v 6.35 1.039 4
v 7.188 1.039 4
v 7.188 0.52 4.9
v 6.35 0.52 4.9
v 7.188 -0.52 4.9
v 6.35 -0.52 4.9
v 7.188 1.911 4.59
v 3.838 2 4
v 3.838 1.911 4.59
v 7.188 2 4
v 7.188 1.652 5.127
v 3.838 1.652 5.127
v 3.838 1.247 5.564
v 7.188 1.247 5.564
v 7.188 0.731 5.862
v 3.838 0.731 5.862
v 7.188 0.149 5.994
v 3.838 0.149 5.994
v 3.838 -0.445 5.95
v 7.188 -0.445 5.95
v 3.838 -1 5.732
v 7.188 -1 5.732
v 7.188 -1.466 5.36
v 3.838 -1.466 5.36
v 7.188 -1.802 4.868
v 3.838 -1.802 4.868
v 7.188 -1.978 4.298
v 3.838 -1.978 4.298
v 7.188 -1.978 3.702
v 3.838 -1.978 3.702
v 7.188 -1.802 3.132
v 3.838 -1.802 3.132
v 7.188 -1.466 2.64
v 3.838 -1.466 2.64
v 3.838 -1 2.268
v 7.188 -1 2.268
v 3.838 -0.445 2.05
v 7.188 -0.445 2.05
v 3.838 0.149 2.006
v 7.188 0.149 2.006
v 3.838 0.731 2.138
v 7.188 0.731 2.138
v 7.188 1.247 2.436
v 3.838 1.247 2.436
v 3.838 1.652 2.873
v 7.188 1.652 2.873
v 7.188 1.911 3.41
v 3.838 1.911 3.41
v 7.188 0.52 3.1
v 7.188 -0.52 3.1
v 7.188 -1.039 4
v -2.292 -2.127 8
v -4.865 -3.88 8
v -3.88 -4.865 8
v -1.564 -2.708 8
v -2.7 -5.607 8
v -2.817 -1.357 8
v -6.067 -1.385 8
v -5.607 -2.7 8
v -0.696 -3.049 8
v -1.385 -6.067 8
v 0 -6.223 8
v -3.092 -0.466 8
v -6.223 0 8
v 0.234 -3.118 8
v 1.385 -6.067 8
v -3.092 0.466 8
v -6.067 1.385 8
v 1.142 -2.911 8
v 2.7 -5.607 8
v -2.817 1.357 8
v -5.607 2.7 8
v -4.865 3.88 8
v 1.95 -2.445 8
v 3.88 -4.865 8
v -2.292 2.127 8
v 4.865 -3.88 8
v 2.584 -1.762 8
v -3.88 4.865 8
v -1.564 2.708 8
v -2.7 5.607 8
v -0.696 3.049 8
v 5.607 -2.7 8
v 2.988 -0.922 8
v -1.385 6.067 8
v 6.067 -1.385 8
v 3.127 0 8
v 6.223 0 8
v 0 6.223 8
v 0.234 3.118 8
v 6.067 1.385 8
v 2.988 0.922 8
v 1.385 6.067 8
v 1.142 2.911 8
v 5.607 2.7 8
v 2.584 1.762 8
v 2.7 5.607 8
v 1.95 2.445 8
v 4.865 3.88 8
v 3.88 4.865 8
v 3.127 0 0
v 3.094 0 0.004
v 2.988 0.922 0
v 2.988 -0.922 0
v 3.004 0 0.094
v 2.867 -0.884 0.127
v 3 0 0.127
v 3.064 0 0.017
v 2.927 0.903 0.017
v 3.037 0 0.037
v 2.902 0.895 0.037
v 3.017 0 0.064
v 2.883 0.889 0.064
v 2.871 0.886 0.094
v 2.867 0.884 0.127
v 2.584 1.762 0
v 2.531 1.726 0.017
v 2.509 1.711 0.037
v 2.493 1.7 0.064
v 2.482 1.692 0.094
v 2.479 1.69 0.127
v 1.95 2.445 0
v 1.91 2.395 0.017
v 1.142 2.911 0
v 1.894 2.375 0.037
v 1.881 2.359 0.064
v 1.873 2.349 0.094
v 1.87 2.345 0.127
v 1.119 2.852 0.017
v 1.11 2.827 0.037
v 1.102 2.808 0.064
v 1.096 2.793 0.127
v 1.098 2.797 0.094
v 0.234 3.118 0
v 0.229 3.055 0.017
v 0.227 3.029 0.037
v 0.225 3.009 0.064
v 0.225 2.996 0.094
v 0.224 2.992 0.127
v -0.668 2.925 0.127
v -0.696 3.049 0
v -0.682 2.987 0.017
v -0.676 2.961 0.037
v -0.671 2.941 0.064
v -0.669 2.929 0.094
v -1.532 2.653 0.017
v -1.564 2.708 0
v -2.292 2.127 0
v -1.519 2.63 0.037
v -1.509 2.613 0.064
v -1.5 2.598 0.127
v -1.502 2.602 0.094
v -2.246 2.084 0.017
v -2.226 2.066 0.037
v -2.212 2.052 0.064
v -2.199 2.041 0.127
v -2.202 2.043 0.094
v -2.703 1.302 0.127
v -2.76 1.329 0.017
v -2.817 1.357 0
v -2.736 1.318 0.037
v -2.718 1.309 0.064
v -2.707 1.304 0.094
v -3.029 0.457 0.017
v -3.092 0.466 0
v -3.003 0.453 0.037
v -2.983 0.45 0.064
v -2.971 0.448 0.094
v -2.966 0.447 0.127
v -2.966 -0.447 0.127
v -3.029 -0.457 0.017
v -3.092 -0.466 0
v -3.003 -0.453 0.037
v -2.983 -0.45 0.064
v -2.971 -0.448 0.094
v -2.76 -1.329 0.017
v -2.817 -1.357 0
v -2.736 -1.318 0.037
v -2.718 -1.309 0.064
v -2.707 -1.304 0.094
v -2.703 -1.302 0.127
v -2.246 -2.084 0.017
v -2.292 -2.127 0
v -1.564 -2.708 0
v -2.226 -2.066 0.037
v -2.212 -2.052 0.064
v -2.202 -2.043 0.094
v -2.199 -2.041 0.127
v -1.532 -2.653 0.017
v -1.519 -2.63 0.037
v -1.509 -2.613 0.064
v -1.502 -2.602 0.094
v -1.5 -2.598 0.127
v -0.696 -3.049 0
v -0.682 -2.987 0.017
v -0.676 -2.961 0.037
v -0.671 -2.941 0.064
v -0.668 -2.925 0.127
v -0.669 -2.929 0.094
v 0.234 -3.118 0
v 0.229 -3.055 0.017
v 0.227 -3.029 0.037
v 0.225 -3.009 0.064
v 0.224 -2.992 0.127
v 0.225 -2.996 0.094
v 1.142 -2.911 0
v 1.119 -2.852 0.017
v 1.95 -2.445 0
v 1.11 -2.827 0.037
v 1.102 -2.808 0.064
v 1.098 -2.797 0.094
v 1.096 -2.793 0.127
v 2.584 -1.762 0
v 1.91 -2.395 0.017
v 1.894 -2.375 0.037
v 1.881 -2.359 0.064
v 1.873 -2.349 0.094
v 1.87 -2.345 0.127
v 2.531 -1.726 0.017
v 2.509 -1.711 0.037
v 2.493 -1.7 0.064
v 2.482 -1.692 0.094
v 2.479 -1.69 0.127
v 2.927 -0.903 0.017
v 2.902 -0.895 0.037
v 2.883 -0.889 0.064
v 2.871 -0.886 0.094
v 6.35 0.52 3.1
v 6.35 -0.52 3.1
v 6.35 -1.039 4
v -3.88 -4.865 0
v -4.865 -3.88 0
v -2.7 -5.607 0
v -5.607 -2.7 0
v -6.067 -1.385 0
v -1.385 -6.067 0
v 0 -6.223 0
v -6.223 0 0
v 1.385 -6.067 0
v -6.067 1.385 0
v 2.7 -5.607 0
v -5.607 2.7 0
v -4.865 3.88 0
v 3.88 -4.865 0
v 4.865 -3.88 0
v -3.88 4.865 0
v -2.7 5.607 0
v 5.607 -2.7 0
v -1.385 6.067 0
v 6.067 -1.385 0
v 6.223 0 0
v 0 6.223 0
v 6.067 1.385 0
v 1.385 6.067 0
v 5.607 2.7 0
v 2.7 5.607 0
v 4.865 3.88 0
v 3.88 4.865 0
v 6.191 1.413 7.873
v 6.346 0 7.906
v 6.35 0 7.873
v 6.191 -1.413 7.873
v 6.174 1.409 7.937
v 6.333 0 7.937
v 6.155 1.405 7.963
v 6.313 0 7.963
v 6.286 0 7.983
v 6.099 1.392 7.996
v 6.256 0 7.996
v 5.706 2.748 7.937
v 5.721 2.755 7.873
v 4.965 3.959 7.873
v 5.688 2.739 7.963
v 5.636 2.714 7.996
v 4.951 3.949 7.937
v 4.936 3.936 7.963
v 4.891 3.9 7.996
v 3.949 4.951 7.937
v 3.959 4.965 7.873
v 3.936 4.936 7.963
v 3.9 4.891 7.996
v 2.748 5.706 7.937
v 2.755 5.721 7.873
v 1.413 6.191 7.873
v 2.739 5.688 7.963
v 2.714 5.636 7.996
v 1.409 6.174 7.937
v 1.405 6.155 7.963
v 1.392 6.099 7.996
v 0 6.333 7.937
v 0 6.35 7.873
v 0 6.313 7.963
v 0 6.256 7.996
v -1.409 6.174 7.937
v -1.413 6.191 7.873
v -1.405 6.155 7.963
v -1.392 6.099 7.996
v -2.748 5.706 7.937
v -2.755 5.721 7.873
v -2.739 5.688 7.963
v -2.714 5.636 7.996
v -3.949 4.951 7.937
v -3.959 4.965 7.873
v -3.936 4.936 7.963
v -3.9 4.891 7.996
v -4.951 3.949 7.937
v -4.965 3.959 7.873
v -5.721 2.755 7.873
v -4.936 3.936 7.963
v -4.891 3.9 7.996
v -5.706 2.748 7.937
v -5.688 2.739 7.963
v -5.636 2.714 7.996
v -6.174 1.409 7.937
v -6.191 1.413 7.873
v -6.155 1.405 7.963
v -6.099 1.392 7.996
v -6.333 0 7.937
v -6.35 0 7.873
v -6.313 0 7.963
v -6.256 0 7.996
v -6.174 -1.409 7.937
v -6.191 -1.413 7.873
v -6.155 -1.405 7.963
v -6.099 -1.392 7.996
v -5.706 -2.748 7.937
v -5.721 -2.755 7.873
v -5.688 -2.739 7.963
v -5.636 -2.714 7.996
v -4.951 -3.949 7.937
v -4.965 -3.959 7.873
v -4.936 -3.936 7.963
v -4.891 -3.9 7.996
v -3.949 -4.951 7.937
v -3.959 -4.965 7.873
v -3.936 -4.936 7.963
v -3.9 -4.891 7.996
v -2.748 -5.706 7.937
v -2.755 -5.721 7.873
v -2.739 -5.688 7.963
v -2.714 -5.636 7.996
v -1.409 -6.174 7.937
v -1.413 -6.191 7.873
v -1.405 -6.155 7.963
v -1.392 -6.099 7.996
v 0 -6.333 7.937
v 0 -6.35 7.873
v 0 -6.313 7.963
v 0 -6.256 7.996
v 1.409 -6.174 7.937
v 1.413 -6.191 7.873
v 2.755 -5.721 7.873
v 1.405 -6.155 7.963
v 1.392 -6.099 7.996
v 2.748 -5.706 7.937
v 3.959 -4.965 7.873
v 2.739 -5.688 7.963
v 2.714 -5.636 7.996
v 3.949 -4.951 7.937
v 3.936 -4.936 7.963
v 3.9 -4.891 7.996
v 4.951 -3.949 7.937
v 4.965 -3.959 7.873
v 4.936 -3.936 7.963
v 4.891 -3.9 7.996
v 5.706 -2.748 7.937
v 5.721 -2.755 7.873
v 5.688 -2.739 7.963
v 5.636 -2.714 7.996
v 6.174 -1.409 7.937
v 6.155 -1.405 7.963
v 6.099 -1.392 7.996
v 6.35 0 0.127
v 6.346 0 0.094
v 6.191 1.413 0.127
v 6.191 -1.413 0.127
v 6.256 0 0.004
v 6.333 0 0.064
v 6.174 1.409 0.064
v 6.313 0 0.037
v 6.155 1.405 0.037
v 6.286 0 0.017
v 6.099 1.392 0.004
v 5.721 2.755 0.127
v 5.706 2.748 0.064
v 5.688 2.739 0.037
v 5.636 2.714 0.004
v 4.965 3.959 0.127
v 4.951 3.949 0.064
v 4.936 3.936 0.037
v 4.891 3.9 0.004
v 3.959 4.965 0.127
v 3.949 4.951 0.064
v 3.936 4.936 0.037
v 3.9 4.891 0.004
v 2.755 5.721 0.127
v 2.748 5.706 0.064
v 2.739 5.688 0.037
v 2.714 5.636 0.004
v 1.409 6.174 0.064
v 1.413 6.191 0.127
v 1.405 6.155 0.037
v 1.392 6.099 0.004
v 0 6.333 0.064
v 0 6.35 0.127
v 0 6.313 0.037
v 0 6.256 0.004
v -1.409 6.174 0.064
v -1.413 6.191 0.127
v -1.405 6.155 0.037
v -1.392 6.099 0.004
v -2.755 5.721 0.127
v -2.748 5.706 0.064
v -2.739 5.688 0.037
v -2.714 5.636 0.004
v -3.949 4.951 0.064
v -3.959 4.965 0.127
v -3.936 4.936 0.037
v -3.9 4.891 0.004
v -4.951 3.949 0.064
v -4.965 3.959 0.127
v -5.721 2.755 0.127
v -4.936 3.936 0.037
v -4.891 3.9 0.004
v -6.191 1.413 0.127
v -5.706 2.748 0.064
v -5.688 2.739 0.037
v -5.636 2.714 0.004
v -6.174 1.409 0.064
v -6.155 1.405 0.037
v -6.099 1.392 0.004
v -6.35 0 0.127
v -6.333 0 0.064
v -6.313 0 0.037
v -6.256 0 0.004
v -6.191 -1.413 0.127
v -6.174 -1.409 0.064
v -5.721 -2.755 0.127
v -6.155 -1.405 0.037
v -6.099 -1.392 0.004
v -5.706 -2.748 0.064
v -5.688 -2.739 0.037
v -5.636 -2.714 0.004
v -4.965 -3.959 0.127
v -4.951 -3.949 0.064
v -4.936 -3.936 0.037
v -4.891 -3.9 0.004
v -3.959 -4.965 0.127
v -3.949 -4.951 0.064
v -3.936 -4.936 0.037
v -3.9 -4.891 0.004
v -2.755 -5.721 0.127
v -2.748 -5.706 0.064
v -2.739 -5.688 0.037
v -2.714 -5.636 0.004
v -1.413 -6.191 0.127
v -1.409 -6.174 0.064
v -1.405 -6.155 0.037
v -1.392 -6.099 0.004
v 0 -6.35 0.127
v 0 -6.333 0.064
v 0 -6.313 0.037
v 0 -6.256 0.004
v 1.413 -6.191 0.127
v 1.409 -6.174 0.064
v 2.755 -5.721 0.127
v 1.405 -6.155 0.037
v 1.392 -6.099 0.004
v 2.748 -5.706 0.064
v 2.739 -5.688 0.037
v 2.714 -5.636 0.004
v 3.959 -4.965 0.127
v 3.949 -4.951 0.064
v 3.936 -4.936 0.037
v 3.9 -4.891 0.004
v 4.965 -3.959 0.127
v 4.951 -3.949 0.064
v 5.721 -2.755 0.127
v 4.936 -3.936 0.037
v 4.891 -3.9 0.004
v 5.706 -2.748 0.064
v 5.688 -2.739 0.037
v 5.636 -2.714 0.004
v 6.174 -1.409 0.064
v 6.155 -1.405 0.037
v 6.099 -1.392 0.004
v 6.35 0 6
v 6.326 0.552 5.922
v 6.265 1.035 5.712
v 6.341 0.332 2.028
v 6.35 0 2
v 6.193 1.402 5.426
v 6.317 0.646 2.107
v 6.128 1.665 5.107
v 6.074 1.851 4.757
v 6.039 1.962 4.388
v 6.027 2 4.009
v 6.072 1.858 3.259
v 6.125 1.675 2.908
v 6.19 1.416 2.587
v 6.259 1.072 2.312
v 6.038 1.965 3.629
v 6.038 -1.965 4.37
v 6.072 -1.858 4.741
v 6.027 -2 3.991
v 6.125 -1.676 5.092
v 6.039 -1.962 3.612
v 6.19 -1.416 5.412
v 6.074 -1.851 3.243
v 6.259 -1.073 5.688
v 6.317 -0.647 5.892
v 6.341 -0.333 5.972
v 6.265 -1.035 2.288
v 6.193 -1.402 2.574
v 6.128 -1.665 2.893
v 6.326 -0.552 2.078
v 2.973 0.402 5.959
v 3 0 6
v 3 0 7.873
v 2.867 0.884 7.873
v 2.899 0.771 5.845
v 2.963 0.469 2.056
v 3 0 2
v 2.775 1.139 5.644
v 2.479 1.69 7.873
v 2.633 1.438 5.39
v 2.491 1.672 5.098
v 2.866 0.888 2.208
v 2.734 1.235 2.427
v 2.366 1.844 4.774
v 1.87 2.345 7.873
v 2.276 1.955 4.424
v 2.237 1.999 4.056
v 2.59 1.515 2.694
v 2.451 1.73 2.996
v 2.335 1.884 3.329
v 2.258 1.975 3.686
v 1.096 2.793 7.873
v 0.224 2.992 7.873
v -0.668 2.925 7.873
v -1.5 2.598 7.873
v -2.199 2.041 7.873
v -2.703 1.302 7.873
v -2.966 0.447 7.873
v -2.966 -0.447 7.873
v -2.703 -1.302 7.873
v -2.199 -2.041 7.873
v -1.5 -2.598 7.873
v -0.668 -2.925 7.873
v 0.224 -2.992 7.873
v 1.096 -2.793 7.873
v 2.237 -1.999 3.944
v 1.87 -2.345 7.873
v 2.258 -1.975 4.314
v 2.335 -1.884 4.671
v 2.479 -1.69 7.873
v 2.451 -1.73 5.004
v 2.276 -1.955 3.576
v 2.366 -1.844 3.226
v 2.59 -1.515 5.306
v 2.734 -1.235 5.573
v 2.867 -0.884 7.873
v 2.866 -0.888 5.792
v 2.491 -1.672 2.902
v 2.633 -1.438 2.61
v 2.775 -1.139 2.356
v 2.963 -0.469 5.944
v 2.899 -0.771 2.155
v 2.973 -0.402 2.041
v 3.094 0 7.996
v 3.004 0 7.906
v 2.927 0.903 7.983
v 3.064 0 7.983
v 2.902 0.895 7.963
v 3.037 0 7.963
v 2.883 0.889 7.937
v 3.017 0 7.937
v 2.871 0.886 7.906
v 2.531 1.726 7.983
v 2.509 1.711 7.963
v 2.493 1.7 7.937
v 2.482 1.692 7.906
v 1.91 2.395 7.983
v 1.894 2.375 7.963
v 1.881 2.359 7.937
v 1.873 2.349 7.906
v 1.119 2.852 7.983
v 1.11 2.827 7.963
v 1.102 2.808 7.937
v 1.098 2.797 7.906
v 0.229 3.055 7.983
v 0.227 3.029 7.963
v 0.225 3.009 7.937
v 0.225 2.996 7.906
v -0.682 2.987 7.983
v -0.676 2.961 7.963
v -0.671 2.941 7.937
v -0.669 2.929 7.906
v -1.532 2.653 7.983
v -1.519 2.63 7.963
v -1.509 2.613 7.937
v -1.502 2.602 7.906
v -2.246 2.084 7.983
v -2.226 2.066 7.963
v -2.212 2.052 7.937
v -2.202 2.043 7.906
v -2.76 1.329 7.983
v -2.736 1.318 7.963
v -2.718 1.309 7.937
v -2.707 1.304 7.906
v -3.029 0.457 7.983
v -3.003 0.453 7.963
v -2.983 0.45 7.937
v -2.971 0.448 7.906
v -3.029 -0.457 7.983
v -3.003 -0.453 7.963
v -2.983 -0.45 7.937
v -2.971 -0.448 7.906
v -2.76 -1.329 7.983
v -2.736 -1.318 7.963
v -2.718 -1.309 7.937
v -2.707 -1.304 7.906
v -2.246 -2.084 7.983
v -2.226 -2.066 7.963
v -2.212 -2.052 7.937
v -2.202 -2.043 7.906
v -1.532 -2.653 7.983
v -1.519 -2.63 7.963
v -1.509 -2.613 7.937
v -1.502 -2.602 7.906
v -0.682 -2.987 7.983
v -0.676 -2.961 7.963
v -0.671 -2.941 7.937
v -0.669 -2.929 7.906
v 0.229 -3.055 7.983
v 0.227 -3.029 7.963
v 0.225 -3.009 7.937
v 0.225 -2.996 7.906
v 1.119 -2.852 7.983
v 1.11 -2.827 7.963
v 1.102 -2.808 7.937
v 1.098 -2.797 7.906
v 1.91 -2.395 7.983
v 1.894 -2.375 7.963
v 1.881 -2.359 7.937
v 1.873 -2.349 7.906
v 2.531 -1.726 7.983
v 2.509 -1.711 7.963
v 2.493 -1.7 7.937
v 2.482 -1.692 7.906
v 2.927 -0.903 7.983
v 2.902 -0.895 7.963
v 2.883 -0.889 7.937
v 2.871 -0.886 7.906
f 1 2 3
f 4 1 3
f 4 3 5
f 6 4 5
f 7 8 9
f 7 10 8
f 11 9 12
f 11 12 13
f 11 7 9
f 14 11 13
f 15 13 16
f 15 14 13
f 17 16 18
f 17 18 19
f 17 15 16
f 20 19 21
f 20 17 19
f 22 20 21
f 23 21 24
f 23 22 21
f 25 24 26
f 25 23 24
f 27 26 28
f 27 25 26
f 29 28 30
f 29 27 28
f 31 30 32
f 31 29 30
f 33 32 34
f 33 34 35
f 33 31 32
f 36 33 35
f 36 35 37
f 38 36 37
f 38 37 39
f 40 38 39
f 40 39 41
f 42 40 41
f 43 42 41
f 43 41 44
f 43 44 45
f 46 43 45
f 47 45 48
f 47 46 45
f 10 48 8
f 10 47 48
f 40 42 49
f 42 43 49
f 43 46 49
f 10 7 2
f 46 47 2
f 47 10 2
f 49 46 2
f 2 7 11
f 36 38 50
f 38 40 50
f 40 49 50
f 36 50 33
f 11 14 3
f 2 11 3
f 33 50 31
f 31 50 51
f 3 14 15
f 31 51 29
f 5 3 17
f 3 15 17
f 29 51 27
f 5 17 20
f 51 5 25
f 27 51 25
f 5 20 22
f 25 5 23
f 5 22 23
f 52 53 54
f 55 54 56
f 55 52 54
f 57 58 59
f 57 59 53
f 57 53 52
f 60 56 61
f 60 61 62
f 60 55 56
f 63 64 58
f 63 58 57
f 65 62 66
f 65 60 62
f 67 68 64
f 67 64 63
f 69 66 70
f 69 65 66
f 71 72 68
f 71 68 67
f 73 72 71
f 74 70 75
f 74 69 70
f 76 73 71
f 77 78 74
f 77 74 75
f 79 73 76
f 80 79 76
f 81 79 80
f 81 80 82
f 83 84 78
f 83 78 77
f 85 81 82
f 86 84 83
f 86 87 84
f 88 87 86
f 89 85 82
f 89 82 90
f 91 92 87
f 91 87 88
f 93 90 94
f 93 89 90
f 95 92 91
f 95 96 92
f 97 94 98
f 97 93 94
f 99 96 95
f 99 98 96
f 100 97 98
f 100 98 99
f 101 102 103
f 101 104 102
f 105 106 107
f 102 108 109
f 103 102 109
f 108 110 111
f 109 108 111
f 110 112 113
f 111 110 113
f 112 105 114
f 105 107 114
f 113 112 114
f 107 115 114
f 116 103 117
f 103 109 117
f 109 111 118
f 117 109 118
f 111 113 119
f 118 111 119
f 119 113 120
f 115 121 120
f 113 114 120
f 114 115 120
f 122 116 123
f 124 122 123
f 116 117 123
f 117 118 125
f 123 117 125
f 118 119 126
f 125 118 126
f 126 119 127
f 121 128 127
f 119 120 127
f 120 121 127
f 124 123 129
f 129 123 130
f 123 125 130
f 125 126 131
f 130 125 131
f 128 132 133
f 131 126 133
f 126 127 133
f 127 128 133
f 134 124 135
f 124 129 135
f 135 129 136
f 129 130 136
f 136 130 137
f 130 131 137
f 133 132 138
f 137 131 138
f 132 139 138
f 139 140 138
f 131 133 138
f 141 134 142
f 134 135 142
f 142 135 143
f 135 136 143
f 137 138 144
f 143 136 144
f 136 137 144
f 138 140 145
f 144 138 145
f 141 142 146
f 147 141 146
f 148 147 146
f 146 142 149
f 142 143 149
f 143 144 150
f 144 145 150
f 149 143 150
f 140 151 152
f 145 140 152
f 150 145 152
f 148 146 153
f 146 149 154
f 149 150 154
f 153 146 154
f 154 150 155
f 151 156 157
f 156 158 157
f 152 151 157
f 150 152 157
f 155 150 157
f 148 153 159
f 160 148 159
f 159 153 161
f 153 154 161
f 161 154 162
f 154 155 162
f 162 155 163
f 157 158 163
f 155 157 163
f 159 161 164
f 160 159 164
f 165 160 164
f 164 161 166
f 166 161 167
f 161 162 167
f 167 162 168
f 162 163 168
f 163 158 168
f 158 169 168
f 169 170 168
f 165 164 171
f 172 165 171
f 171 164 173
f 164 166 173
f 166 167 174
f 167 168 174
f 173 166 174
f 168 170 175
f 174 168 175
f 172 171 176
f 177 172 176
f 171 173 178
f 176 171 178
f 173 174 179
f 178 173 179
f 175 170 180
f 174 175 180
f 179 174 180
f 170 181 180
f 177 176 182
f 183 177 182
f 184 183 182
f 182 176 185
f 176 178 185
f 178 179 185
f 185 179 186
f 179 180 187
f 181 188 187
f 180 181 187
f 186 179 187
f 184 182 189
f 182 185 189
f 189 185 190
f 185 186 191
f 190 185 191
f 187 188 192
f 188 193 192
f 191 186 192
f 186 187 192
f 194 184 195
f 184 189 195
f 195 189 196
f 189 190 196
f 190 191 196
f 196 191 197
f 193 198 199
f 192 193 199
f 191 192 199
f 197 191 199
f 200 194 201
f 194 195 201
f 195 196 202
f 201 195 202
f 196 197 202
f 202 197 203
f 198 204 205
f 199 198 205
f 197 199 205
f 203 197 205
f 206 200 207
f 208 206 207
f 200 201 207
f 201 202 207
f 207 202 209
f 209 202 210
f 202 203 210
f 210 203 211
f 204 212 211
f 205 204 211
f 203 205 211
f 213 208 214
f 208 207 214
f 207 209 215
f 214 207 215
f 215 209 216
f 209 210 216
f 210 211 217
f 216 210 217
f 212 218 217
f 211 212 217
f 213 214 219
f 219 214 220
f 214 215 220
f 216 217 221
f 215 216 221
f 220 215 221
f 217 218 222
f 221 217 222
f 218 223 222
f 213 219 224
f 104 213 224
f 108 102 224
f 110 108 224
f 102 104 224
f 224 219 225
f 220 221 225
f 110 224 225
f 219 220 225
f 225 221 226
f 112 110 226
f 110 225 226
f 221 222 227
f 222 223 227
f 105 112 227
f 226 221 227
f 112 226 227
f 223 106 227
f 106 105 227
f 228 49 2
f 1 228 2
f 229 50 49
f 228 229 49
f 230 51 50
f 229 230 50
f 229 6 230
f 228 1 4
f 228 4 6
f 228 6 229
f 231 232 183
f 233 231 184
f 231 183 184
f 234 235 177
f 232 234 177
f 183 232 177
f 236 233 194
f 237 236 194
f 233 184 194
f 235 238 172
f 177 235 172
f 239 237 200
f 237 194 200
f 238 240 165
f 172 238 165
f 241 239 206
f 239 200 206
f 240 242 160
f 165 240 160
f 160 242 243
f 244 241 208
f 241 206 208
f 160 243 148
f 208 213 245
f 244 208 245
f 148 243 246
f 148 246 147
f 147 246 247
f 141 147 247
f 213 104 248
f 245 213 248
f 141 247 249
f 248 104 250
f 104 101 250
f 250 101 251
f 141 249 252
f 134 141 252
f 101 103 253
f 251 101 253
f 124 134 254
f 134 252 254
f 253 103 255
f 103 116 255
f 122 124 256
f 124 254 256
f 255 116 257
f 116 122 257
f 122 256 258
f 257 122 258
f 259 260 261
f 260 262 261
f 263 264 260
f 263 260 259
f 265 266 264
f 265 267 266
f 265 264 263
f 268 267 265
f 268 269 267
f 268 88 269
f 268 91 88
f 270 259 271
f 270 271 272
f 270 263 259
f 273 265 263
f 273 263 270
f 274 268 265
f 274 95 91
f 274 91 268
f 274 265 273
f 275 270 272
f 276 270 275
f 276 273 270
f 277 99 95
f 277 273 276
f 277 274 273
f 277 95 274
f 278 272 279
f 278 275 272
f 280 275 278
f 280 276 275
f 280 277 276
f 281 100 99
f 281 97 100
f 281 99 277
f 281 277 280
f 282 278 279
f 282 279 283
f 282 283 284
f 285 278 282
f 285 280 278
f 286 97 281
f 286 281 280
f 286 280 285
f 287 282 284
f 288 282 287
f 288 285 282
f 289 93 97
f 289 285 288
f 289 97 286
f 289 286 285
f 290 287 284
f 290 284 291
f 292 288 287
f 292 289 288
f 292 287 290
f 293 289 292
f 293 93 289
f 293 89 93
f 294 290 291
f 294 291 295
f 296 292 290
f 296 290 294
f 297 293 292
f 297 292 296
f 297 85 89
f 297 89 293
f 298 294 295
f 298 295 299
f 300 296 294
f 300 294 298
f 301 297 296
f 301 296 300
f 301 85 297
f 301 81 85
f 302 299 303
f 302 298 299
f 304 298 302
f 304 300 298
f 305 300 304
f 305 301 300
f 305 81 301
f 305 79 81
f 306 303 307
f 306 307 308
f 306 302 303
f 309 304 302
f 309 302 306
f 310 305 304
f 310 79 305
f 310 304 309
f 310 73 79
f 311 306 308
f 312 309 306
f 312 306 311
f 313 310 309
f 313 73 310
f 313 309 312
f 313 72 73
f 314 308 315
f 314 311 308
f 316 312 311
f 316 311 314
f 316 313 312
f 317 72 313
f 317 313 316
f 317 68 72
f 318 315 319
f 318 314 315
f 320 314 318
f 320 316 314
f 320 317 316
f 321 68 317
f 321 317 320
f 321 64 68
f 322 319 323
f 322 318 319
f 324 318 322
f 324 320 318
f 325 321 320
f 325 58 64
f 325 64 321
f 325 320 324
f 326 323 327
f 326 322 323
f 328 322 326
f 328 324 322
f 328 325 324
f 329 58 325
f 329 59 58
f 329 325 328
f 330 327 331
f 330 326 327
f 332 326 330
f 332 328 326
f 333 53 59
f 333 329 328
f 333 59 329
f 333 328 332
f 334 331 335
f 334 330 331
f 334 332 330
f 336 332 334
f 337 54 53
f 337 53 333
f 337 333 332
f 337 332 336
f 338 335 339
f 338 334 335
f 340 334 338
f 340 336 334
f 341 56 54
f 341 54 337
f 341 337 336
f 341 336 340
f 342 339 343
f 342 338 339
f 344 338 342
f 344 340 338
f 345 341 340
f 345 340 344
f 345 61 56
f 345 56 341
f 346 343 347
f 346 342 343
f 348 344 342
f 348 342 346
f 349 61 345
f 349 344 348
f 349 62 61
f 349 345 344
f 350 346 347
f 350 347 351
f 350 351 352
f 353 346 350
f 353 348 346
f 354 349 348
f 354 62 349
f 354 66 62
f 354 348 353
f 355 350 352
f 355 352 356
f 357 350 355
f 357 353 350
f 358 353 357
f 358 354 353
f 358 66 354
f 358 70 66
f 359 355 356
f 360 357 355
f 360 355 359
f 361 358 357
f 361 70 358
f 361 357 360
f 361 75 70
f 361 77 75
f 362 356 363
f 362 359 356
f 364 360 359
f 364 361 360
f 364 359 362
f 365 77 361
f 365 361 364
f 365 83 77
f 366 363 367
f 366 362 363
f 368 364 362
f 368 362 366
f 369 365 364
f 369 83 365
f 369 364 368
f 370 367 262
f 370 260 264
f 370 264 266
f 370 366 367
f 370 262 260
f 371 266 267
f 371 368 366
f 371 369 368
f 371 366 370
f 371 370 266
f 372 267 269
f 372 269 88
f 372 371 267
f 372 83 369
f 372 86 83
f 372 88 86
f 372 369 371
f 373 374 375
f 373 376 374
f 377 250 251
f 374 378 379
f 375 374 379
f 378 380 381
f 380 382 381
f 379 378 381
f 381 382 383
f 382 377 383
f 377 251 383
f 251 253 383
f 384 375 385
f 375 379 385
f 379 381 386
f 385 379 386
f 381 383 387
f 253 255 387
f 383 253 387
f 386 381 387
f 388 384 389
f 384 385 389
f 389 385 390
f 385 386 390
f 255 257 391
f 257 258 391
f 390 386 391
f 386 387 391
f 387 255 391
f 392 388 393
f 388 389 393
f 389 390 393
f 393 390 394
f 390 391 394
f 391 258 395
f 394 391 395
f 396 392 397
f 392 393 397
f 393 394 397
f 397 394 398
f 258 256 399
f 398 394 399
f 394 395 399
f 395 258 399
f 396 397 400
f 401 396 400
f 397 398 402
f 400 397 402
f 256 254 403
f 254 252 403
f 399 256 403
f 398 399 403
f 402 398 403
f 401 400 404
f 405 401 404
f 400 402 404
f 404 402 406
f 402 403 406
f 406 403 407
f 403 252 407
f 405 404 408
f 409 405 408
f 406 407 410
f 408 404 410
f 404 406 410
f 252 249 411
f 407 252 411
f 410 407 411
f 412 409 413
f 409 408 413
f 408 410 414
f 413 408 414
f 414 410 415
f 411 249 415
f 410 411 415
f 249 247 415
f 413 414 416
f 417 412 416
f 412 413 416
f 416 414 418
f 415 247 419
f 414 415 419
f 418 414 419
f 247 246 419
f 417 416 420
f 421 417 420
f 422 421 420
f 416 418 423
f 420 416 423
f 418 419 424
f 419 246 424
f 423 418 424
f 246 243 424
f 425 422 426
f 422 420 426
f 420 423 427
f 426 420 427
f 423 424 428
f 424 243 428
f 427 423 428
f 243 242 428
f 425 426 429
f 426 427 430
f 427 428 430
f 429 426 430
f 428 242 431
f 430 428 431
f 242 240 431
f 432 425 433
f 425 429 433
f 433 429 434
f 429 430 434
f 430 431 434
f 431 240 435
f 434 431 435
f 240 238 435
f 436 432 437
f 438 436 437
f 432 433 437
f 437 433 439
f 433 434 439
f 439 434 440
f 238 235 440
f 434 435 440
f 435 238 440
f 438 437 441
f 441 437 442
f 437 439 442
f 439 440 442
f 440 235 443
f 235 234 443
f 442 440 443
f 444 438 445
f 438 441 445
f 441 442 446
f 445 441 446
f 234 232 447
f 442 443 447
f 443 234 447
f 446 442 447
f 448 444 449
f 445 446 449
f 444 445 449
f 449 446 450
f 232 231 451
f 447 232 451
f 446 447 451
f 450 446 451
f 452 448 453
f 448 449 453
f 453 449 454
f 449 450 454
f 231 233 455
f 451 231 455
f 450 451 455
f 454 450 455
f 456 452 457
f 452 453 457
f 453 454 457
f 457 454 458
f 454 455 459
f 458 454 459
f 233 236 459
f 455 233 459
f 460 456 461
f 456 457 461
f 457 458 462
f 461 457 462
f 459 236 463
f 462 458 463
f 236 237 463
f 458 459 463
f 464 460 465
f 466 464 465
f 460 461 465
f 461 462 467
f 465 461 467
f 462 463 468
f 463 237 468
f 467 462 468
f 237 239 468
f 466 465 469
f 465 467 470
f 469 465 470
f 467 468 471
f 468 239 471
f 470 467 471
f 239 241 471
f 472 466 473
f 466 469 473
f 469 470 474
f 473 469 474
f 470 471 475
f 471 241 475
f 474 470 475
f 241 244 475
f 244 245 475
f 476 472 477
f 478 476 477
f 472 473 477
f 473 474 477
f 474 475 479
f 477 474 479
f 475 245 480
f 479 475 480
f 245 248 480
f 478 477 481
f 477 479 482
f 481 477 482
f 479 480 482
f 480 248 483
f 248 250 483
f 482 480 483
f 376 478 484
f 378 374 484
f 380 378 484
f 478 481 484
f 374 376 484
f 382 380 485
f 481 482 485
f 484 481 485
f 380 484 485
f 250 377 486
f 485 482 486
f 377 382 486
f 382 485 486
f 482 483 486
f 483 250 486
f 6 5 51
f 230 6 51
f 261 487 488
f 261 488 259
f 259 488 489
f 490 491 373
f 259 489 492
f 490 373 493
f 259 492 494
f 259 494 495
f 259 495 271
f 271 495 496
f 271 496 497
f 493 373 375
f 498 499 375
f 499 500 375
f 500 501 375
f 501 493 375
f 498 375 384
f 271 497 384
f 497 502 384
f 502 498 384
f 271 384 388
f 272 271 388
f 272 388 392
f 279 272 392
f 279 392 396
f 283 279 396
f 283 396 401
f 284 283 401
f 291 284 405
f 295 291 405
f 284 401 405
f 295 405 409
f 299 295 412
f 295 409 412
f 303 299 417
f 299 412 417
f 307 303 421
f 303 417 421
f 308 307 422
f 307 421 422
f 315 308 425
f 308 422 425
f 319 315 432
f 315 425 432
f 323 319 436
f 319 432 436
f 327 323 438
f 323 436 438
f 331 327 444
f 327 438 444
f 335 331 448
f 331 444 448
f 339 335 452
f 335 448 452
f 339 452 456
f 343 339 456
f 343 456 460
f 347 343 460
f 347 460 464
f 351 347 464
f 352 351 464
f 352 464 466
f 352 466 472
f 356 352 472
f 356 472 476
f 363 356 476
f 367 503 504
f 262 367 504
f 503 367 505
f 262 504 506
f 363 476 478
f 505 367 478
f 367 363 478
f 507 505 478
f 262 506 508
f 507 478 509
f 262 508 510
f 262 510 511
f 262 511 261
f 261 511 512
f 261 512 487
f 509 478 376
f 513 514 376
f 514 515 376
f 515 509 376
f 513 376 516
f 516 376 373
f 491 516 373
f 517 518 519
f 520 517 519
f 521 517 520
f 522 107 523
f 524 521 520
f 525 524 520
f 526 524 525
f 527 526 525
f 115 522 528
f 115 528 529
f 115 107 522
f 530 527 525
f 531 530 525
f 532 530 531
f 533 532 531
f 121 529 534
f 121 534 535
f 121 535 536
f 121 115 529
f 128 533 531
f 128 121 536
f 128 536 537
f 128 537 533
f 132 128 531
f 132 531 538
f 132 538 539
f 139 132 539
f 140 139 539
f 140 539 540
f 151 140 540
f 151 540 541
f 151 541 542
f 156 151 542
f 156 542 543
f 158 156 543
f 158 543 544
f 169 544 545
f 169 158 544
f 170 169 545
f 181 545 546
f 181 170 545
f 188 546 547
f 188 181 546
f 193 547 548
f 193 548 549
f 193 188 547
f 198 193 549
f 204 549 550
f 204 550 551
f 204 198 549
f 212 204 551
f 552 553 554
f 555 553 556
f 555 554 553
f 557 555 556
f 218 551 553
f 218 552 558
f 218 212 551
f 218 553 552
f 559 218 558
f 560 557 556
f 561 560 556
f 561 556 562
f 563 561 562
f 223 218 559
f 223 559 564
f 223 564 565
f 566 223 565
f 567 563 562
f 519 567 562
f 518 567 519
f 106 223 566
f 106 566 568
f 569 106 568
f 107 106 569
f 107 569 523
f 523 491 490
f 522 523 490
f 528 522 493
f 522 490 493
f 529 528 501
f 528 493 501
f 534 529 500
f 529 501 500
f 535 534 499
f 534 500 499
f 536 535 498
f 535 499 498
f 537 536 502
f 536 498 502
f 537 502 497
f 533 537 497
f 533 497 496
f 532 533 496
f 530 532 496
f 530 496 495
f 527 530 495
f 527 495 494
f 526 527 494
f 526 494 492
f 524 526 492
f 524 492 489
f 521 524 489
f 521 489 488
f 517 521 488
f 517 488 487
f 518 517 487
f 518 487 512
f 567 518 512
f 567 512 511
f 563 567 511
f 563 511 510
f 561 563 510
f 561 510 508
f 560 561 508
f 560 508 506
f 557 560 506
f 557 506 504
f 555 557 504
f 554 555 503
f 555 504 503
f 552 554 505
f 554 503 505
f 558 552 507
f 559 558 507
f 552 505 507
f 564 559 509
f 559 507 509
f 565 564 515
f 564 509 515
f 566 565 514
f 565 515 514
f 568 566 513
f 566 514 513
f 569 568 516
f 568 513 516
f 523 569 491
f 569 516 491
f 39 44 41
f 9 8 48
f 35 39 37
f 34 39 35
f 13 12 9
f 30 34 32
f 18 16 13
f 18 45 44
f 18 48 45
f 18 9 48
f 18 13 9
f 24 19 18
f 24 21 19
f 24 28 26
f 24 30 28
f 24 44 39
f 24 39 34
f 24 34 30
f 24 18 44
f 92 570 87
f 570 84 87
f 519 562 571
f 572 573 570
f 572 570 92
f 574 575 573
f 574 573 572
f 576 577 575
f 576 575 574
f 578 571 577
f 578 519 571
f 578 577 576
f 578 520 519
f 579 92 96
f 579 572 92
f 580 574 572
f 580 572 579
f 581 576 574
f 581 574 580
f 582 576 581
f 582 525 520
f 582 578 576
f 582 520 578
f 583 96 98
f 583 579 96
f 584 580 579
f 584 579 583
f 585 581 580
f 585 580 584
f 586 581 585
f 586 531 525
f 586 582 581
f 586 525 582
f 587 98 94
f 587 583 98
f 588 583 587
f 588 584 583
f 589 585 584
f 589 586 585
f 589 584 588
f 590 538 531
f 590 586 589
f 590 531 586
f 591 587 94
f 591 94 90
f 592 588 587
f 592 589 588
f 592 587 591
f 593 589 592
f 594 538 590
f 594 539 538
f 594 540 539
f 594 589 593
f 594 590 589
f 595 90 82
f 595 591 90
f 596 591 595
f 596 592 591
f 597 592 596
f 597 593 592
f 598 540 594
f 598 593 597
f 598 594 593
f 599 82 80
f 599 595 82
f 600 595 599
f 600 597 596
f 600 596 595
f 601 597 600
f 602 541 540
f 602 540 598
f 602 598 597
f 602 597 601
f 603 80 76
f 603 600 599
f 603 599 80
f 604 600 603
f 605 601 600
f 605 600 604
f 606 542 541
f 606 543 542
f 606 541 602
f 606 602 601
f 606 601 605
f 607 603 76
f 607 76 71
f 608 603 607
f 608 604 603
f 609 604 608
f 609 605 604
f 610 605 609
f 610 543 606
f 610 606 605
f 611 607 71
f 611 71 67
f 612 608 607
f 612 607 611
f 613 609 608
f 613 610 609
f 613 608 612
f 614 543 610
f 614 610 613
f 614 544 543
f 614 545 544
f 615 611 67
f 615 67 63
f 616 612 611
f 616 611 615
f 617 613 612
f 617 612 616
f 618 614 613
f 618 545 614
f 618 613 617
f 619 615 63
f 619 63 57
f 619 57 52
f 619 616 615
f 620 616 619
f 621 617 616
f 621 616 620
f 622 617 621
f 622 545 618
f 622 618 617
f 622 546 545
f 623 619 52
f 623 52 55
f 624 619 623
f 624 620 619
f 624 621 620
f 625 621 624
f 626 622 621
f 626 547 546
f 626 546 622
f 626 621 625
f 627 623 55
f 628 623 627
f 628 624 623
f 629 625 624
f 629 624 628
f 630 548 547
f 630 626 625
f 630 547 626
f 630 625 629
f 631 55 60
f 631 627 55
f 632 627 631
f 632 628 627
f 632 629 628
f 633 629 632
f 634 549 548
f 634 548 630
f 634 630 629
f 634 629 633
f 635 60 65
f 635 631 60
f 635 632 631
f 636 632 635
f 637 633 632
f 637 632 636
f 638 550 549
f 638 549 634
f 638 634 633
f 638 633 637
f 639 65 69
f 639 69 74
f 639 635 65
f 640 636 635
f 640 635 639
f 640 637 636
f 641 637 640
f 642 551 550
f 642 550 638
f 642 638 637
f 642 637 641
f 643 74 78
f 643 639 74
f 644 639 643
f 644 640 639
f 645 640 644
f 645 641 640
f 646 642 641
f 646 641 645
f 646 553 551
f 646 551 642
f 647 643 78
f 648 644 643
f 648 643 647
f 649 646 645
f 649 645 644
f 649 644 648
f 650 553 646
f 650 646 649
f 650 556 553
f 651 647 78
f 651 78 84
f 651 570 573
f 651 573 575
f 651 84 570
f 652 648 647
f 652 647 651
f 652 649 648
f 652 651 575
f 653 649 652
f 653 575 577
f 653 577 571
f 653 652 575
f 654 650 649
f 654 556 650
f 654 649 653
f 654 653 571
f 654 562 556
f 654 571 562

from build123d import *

# Parameters (mm, degrees)
SKETCH1_R          = 6.35
SKETCH1_R_2        = 3
EXTRUDE1_DEPTH     = 8
CUT_EXTRUDE1_REACH = 14.7
SKETCH2_R          = 2
SKETCH3_W          = 3.35
SKETCH3_H          = 2
CUT_EXTRUDE2_DEPTH = 0.8375
FILLET1_R          = 0.127


with BuildPart() as part:
    # Sketch1 → Extrude1 (new body)
    with BuildSketch(Plane.XY):
        Circle(SKETCH1_R)
        Circle(SKETCH1_R_2, mode=Mode.SUBTRACT)
    extrude(amount=EXTRUDE1_DEPTH)

    # Sketch2 → Cut-Extrude1 (cut, up to next)
    with BuildSketch(Plane(origin=(6.35, 0, 0), x_dir=(0, 0, -1), z_dir=(1, 0, 0)), mode=Mode.PRIVATE) as cut_extrude1_sk1:
        with Locations((-4, 0)):
            Circle(SKETCH2_R)
    cut_extrude1_tool1 = extrude(cut_extrude1_sk1.sketch, amount=-CUT_EXTRUDE1_REACH, mode=Mode.PRIVATE) & part.part
    add(cut_extrude1_tool1.solids().sort_by_distance((6.35, 0, 4))[0], mode=Mode.SUBTRACT)

    # Fillet1
    fillet1_edges = [part.edges().sort_by_distance(p)[0] for p in [
        (-6.35, 0, 0),
        (-6.35, 0, 8),
        (-3, 0, 0),
        (-3, 0, 8),
    ]]
    fillet(fillet1_edges, radius=FILLET1_R)


with BuildPart() as body_2:
    # Sketch3 → Revolve1 (revolve)
    with BuildSketch(Plane.XY.offset(4)):
        with Locations((5.5125, 1)):
            Rectangle(SKETCH3_W, SKETCH3_H)
    revolve(axis=Axis((3.8375, 0, 4), (1, 0, 0)))

    # Sketch4 → Cut-Extrude2 (cut)
    with BuildSketch(Plane(origin=(7.1875, 0, 0), x_dir=(0, 0, -1), z_dir=(1, 0, 0))):
        Polygon((-4, 1.039230485), (-4.9, 0.519615242), (-4.9, -0.519615242), (-4, -1.039230485), (-3.1, -0.519615242), (-3.1, 0.519615242), align=None)
    extrude(amount=-CUT_EXTRUDE2_DEPTH, mode=Mode.SUBTRACT)


solid = Compound([part.part, body_2.part])
